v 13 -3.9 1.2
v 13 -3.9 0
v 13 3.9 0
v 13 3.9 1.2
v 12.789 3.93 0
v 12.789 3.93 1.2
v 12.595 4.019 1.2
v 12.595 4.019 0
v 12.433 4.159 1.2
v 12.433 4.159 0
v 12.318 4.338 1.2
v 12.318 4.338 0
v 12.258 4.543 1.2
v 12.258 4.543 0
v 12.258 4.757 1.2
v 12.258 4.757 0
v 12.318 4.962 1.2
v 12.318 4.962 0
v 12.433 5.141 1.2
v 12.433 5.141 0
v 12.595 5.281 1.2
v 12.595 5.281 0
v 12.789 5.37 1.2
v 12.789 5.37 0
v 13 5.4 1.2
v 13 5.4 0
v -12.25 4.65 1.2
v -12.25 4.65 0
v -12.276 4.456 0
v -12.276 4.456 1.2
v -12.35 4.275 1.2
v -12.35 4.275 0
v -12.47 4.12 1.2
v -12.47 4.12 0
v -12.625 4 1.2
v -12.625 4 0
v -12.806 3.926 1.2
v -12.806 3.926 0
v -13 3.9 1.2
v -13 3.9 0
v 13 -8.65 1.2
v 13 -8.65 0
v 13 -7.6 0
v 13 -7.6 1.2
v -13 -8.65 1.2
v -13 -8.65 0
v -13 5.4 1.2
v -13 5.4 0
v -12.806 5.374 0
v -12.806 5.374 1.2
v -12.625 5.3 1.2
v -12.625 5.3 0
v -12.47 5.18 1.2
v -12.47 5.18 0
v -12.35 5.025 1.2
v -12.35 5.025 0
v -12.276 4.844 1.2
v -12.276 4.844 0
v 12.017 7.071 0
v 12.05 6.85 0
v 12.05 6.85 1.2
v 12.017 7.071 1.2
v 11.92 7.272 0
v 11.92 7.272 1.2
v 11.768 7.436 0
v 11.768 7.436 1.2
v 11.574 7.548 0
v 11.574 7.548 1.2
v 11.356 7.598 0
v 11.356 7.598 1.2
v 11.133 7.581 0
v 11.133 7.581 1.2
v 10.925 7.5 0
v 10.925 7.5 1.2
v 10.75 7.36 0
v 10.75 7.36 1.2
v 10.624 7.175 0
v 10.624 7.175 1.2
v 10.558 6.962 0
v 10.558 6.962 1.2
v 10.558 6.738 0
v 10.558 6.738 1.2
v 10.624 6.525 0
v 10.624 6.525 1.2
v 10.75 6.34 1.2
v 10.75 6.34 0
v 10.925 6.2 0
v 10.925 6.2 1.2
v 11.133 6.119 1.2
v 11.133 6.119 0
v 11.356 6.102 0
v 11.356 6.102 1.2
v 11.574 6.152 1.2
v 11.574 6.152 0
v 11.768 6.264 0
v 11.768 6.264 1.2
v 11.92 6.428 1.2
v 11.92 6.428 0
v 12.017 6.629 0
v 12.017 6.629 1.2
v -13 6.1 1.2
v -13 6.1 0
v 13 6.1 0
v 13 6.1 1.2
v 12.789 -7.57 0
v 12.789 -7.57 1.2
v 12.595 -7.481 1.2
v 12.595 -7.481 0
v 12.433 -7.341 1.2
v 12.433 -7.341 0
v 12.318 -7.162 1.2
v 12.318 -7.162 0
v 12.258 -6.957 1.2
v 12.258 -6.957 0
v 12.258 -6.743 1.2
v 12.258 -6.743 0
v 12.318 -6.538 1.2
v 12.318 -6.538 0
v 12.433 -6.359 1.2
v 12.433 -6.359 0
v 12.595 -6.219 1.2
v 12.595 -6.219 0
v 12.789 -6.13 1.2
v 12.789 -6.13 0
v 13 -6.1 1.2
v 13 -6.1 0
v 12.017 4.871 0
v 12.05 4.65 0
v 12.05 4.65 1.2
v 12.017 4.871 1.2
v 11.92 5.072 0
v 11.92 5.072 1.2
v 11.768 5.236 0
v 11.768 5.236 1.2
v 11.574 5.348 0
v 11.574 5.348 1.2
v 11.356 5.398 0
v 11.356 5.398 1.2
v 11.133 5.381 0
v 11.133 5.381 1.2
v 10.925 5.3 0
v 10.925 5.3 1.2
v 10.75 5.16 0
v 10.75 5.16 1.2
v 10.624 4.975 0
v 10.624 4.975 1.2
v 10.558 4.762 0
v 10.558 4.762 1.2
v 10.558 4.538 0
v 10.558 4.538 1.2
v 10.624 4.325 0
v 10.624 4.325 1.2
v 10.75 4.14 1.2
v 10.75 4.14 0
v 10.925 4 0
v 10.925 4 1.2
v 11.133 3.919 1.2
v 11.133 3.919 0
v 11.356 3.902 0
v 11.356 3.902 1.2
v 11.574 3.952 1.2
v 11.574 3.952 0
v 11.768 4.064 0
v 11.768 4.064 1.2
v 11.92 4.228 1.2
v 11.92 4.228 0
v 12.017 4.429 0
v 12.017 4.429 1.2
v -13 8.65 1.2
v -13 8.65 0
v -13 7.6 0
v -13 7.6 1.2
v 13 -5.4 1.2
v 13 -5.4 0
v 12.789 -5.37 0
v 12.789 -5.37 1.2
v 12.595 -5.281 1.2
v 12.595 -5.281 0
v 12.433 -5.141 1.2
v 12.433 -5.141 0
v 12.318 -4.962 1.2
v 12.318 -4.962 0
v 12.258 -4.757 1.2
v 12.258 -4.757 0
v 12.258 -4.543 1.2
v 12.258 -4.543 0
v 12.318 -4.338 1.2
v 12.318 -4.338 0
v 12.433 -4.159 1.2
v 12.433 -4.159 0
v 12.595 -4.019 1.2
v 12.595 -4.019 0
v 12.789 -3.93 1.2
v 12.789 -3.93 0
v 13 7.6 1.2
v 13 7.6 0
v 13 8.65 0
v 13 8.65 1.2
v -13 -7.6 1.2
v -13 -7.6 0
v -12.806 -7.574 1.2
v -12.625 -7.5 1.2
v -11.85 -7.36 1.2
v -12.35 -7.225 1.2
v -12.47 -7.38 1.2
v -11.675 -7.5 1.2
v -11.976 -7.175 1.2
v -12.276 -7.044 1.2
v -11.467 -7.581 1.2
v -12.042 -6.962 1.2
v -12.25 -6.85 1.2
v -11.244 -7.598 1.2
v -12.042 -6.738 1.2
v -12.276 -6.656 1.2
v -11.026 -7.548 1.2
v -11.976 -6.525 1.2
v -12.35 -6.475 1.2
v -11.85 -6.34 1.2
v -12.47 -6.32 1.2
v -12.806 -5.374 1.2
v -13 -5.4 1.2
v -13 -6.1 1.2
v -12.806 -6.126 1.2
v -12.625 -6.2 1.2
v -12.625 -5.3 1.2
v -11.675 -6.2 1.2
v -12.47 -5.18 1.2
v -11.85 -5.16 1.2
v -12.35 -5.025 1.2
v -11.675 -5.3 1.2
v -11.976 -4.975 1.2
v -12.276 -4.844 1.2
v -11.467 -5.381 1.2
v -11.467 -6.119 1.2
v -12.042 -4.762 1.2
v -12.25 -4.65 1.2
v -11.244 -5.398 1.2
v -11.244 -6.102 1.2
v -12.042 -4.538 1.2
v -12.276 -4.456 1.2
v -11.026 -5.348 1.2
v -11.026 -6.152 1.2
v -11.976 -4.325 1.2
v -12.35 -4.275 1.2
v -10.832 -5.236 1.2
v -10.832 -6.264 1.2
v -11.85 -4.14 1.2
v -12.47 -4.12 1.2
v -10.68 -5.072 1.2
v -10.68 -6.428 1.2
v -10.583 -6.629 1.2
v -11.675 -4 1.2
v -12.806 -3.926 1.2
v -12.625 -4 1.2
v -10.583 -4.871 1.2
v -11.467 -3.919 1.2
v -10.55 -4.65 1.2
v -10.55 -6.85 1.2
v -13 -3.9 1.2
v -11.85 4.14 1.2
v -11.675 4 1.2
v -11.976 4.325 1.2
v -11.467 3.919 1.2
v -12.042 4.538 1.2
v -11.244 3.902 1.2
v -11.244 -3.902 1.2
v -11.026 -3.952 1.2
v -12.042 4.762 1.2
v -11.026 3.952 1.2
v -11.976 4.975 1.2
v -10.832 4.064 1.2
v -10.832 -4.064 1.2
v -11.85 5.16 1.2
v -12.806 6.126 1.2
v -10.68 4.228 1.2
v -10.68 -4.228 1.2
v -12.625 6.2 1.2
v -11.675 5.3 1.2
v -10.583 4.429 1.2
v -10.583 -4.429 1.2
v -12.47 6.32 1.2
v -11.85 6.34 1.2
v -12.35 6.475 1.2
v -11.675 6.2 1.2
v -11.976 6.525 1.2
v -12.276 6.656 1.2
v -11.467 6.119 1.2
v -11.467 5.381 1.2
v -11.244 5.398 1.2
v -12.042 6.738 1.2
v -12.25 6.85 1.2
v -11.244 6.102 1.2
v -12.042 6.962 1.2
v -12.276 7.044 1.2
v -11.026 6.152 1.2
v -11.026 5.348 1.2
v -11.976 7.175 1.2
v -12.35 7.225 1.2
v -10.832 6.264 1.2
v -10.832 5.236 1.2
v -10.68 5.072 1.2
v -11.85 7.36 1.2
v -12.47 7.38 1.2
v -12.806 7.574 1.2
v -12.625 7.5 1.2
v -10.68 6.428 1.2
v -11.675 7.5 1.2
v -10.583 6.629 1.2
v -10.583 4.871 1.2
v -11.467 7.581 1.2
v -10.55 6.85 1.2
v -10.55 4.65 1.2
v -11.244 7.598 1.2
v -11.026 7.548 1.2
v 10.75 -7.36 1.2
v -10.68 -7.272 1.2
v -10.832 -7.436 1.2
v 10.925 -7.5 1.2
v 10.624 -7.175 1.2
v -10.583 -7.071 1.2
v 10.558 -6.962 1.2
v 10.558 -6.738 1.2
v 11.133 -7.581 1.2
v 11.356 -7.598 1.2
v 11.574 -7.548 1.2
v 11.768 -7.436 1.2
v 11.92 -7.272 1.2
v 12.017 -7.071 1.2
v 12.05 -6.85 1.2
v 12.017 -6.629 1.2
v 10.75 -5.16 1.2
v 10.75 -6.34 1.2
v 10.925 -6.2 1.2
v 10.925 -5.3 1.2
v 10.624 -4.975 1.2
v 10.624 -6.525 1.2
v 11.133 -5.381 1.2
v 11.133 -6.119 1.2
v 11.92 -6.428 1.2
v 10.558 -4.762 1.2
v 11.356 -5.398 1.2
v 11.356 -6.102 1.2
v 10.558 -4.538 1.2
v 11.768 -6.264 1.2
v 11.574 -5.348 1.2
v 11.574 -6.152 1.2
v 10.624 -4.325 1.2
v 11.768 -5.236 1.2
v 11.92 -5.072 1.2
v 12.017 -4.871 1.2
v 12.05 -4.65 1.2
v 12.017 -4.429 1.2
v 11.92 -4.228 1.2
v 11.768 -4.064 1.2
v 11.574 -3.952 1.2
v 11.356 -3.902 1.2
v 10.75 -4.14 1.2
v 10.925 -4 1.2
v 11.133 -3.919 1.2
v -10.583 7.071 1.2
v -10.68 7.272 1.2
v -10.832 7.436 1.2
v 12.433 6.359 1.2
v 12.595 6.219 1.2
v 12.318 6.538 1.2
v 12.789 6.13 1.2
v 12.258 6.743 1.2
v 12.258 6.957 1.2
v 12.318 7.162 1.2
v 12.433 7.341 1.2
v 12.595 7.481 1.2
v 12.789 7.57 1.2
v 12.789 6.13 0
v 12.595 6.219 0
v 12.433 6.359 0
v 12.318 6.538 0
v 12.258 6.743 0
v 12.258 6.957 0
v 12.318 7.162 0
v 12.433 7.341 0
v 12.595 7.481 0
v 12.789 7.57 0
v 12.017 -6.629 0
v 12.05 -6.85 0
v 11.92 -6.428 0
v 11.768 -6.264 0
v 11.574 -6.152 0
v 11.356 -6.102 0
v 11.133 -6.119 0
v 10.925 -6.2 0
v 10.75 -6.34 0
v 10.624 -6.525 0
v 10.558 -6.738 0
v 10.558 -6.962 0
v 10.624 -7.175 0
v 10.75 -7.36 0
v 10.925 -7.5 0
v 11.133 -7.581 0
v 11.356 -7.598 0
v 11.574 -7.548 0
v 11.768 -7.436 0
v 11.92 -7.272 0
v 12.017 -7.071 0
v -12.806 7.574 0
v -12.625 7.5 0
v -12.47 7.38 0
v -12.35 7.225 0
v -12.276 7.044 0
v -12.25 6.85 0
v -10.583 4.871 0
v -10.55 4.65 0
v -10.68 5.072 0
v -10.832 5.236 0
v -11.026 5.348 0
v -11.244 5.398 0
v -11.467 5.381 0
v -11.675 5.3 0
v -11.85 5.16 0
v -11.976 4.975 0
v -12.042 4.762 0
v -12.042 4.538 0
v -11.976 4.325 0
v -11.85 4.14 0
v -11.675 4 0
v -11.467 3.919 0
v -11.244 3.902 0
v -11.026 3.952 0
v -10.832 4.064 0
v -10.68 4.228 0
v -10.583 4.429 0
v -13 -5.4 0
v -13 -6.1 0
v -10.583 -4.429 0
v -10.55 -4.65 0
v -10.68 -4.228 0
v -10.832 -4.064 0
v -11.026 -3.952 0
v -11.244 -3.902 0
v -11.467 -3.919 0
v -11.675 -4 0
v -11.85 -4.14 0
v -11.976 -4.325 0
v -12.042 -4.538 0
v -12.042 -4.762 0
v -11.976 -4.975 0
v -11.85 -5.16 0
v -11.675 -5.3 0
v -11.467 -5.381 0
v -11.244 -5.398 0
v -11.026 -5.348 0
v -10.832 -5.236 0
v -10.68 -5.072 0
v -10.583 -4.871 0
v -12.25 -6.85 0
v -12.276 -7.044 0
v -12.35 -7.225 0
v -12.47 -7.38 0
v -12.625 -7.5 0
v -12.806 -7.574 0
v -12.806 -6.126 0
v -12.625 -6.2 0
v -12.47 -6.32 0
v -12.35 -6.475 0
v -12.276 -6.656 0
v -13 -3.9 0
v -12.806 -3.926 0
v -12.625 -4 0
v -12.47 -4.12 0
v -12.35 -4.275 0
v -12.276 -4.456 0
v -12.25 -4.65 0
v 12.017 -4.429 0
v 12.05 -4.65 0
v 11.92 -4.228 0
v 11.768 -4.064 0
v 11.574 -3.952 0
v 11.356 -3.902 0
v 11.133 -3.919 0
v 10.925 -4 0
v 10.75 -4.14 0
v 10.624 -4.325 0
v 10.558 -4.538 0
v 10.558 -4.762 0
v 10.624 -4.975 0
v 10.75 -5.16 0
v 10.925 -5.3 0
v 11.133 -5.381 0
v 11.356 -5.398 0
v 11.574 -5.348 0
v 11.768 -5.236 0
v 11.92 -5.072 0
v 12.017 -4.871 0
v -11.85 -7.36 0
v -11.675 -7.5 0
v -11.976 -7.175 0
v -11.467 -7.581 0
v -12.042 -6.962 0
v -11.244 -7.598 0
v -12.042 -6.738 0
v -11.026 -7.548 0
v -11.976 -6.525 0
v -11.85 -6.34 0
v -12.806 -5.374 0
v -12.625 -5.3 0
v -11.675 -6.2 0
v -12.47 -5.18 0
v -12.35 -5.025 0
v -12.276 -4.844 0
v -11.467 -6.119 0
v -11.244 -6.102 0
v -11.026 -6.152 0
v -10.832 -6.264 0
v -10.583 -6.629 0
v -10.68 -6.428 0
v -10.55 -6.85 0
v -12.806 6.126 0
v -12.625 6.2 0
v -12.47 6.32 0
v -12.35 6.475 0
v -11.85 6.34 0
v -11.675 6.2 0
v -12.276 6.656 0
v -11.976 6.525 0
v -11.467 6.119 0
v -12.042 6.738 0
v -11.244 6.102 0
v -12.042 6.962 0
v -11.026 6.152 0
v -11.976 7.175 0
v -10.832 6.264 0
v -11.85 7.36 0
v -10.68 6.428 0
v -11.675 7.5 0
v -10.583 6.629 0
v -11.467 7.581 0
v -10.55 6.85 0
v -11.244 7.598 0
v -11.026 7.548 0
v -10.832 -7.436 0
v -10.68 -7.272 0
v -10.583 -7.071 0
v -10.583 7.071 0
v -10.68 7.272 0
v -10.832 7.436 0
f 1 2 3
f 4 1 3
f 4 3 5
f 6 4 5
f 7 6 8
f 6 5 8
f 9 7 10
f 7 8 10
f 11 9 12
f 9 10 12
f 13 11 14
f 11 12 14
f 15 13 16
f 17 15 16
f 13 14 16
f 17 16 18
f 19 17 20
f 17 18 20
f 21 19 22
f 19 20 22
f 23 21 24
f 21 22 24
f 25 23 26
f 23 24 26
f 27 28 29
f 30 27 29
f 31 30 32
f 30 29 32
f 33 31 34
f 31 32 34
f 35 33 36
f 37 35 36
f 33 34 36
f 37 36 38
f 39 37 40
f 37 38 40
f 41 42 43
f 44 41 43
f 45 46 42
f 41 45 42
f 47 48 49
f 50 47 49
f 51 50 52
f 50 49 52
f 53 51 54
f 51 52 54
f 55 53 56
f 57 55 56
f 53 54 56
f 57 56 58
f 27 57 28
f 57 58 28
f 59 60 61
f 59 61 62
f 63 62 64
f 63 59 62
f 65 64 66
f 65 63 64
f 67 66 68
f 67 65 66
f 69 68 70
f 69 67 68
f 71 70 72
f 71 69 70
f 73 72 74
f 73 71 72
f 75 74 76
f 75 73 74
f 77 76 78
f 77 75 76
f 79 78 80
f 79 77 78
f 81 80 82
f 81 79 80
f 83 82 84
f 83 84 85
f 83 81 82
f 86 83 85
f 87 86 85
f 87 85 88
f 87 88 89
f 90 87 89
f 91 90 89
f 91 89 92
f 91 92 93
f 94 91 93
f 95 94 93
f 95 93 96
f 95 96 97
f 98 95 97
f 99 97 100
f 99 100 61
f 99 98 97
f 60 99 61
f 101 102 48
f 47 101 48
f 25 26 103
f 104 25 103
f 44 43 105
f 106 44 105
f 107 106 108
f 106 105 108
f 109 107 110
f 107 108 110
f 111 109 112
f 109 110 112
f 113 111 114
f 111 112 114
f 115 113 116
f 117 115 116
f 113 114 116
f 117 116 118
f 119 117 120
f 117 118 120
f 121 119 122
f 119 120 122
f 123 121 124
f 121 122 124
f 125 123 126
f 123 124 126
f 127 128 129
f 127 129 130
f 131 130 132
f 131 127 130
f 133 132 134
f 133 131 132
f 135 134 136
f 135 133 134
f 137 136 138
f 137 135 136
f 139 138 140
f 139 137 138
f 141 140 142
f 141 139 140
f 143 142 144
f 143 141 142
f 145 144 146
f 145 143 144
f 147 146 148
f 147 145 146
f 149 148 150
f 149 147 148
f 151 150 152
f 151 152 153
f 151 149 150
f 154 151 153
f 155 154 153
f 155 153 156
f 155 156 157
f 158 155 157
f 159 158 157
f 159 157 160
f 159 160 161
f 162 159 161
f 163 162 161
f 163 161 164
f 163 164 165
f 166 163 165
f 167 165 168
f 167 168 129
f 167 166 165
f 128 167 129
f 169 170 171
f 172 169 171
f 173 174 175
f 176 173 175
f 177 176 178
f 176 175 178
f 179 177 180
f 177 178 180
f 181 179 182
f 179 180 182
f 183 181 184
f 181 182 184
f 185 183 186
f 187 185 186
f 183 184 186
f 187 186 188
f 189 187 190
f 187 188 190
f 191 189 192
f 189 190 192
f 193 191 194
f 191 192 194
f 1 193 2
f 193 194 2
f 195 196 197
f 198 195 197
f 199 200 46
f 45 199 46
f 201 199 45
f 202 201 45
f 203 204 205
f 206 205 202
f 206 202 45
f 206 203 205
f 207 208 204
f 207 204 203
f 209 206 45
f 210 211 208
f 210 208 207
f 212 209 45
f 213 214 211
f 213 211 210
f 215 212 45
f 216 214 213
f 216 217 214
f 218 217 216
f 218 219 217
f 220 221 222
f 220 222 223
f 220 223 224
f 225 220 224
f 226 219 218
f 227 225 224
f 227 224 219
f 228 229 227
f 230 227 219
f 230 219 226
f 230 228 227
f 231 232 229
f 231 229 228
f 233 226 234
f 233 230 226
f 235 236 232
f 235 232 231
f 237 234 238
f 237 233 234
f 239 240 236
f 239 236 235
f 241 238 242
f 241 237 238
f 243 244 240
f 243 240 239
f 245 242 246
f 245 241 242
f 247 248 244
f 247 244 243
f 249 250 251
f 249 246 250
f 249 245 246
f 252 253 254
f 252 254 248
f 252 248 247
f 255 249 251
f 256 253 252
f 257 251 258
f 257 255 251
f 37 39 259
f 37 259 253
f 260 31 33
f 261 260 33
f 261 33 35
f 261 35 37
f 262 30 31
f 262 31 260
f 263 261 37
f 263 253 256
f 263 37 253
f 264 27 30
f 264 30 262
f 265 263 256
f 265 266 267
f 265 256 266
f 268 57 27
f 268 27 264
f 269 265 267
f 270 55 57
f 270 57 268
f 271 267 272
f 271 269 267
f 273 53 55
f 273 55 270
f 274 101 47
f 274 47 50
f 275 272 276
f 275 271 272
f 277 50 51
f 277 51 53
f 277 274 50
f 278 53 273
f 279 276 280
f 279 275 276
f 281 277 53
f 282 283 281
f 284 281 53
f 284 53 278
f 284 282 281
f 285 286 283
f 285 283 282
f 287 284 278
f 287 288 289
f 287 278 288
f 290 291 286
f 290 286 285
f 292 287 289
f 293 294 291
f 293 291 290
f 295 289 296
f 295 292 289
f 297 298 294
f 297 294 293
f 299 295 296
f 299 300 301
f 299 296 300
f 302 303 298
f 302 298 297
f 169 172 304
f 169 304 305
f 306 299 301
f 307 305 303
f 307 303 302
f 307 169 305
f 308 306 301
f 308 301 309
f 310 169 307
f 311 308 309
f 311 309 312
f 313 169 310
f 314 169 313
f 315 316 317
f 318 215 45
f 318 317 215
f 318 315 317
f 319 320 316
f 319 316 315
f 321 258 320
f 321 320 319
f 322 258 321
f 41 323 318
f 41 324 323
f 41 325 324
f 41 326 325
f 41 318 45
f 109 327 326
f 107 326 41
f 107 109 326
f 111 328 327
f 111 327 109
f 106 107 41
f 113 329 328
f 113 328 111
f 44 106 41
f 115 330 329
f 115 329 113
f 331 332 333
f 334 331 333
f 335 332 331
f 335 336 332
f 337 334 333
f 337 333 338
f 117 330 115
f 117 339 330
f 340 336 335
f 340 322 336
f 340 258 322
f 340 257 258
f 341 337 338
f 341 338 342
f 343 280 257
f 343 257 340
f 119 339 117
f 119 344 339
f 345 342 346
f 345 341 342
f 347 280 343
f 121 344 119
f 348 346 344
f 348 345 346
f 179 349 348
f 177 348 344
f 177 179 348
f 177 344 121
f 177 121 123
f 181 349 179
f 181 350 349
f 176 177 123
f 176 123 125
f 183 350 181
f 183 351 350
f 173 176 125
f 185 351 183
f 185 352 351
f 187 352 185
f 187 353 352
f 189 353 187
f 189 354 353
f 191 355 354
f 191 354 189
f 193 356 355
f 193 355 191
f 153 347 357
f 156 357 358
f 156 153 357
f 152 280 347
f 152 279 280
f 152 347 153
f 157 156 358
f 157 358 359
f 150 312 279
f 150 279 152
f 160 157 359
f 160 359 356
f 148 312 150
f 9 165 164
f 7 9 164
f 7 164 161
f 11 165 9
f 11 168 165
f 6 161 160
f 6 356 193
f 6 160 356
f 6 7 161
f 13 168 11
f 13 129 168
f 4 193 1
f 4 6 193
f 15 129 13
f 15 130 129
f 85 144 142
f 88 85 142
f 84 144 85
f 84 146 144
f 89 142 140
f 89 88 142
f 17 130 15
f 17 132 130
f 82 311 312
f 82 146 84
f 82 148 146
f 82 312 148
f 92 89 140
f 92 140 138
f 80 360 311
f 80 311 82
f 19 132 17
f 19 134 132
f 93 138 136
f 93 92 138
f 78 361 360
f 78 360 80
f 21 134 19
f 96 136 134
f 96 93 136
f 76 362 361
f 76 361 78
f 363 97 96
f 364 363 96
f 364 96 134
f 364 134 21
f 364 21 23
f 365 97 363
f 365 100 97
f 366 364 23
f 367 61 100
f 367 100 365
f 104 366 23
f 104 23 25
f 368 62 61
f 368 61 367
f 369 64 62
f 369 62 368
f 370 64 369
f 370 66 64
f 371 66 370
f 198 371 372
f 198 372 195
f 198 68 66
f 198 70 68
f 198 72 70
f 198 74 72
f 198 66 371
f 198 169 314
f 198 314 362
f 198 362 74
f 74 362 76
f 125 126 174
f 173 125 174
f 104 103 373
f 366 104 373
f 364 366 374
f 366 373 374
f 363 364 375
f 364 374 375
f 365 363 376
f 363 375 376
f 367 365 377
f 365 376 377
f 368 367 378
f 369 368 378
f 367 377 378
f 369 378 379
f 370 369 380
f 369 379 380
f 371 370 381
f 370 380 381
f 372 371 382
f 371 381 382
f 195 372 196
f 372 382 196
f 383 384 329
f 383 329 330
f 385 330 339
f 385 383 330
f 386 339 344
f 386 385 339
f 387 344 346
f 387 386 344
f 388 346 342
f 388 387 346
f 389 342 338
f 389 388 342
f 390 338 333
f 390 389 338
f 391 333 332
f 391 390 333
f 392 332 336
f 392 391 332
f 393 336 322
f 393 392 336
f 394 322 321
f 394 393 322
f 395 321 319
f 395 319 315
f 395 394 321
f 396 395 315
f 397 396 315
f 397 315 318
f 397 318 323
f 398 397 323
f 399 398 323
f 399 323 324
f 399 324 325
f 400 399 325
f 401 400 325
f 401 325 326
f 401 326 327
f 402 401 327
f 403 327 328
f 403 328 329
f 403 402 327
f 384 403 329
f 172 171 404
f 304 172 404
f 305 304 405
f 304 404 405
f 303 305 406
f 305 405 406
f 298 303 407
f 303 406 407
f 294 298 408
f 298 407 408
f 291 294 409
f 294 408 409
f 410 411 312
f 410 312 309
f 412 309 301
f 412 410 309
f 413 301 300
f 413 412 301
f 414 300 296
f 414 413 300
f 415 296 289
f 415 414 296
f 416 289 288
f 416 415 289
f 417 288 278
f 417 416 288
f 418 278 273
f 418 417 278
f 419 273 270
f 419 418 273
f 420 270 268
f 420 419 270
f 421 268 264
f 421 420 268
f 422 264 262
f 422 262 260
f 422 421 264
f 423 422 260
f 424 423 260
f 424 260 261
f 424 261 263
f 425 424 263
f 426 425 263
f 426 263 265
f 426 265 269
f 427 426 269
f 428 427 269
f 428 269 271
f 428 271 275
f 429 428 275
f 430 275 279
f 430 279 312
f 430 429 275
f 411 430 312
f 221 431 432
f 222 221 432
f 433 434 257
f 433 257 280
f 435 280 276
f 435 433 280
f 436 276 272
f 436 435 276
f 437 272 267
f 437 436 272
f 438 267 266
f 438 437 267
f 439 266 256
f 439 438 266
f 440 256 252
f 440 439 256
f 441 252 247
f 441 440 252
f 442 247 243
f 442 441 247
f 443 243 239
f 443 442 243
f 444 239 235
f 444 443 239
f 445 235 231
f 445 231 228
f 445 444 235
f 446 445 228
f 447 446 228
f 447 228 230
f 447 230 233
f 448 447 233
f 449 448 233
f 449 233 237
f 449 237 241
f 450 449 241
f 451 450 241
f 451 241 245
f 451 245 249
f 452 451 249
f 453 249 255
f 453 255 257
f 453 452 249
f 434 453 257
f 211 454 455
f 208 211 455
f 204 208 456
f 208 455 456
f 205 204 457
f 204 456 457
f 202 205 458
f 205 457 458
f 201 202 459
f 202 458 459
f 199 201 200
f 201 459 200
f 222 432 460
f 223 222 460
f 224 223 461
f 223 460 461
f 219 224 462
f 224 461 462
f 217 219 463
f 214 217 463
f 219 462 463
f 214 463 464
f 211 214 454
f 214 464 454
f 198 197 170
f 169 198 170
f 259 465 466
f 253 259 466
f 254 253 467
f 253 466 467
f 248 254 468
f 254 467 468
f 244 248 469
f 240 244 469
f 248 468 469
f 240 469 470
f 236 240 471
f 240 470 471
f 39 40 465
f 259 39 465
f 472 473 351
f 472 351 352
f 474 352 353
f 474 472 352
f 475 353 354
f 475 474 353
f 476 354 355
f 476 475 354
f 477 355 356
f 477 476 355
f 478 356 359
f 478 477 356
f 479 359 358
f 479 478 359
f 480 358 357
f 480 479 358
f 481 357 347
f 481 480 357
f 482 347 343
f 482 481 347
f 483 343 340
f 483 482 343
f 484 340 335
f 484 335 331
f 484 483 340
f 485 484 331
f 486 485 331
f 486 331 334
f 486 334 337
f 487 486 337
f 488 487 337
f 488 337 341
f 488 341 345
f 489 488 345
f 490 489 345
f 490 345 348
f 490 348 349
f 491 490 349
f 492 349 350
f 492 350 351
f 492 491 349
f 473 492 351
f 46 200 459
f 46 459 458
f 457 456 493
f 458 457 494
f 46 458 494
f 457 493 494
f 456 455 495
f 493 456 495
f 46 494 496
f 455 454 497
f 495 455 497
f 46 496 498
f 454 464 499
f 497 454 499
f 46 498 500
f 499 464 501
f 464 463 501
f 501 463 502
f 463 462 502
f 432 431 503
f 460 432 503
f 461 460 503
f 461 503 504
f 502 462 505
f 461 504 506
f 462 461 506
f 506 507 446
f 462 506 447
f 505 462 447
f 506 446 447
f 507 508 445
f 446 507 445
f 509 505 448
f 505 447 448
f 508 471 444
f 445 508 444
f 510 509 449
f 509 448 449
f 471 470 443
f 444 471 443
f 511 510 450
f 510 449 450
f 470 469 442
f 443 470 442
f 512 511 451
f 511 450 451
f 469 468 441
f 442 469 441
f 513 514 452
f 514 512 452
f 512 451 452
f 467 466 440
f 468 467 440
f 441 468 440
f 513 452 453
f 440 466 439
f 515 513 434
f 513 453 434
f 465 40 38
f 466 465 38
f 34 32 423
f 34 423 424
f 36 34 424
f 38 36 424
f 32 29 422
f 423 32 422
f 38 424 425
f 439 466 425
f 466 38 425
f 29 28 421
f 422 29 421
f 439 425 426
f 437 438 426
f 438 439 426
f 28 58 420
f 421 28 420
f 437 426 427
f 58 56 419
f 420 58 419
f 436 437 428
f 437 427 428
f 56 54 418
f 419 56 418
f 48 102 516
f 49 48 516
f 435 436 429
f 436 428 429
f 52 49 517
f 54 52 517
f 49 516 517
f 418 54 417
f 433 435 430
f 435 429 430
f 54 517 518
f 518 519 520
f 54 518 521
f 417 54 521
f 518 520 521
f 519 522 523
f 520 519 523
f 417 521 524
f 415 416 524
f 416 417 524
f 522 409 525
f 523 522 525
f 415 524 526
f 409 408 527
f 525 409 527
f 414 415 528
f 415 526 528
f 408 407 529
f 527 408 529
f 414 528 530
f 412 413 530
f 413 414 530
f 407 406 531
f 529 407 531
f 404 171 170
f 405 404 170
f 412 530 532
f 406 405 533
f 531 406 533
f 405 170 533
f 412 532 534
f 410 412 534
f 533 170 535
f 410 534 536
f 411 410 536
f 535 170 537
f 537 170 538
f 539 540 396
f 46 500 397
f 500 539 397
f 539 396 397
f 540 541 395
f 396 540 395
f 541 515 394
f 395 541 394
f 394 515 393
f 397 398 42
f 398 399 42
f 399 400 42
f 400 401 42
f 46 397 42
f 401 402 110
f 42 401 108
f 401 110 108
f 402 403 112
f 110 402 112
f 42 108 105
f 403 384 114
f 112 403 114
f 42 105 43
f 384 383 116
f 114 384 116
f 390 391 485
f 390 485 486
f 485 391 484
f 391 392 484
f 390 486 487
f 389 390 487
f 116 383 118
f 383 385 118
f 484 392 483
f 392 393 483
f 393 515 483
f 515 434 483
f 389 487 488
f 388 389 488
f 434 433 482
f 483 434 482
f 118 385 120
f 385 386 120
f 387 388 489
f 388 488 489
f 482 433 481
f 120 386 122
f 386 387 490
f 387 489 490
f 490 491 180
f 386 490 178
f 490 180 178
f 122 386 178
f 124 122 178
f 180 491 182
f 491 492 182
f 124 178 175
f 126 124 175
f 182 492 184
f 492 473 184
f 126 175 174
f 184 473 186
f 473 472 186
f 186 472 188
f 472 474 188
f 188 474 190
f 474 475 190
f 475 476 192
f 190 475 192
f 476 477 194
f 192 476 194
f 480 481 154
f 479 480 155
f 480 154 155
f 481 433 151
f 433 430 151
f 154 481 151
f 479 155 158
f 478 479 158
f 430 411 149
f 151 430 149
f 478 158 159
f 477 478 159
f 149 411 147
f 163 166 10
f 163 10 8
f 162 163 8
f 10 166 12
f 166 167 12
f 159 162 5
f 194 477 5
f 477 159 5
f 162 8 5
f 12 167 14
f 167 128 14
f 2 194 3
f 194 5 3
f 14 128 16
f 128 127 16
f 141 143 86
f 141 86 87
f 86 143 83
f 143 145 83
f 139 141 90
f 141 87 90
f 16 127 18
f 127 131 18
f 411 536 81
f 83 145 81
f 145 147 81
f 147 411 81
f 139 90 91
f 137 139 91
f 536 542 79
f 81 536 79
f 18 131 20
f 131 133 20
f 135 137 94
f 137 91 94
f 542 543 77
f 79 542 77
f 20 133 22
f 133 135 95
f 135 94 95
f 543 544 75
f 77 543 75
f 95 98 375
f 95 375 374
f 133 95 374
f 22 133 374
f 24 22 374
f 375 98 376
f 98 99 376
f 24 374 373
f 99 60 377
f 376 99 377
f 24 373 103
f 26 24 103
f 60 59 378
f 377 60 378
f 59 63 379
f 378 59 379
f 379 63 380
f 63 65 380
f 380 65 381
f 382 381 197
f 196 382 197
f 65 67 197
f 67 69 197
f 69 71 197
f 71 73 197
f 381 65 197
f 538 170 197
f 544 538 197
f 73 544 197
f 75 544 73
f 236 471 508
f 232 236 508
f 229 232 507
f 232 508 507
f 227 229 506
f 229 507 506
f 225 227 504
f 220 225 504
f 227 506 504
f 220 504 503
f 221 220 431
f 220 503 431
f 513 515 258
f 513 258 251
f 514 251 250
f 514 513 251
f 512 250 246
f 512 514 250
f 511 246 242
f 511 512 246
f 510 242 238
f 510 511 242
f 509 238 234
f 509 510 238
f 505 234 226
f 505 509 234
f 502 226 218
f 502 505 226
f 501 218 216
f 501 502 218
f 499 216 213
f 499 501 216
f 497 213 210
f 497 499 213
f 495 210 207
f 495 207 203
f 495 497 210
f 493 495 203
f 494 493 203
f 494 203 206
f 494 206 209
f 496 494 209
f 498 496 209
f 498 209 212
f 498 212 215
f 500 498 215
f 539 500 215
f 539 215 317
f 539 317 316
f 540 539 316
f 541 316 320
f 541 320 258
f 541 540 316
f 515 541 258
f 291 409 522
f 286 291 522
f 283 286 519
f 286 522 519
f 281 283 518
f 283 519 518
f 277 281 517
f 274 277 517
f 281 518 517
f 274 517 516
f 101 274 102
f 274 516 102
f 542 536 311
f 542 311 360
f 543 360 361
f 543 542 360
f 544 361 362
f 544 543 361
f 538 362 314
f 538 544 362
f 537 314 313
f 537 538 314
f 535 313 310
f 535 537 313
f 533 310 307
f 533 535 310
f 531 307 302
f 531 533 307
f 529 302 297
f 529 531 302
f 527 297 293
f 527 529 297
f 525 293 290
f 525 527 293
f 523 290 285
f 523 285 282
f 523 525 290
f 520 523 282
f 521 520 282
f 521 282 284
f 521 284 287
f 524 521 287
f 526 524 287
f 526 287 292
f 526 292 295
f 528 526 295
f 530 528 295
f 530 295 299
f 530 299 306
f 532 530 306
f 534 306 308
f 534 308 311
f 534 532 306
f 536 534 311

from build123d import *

# Parameters (mm, degrees)
SKETCH1_R           = 0.75
BOSS_EXTRUDE1_DEPTH = 1.2


with BuildPart() as part:
    # Sketch1 → Boss-Extrude1 (new body)
    with BuildSketch(Plane.XY):
        with BuildLine():
            Line((13, 8.65), (-13, 8.65))
            Line((-13, 8.65), (-13, 7.6))
            ThreePointArc((-13, 7.6), (-12.469669914, 7.380330086), (-12.25, 6.85))
            ThreePointArc((-12.25, 6.85), (-12.469669914, 6.319669914), (-13, 6.1))
            Line((-13, 6.1), (-13, 5.4))
            ThreePointArc((-13, 5.4), (-12.469669914, 5.180330086), (-12.25, 4.65))
            ThreePointArc((-12.25, 4.65), (-12.469669914, 4.119669914), (-13, 3.9))
            Line((-13, 3.9), (-13, -3.9))
            ThreePointArc((-13, -3.9), (-12.469669914, -4.119669914), (-12.25, -4.65))
            ThreePointArc((-12.25, -4.65), (-12.469669914, -5.180330086), (-13, -5.4))
            Line((-13, -5.4), (-13, -6.1))
            ThreePointArc((-13, -6.1), (-12.469669914, -6.319669914), (-12.25, -6.85))
            ThreePointArc((-12.25, -6.85), (-12.469669914, -7.380330086), (-13, -7.6))
            Line((-13, -7.6), (-13, -8.65))
            Line((-13, -8.65), (13, -8.65))
            Line((13, -8.65), (13, -7.6))
            ThreePointArc((13, -7.6), (12.25, -6.85), (13, -6.1))
            Line((13, -6.1), (13, -5.4))
            ThreePointArc((13, -5.4), (12.25, -4.65), (13, -3.9))
            Line((13, -3.9), (13, 3.9))
            ThreePointArc((13, 3.9), (12.25, 4.65), (13, 5.4))
            Line((13, 5.4), (13, 6.1))
            ThreePointArc((13, 6.1), (12.25, 6.85), (13, 7.6))
            Line((13, 7.6), (13, 8.65))
        make_face()
        with Locations((-11.3, -6.85)):
            Circle(SKETCH1_R, mode=Mode.SUBTRACT)
        with Locations((-11.3, -4.65)):
            Circle(SKETCH1_R, mode=Mode.SUBTRACT)
        with Locations((11.3, -6.85)):
            Circle(SKETCH1_R, mode=Mode.SUBTRACT)
        with Locations((11.3, -4.65)):
            Circle(SKETCH1_R, mode=Mode.SUBTRACT)
        with Locations((-11.3, 4.65)):
            Circle(SKETCH1_R, mode=Mode.SUBTRACT)
        with Locations((-11.3, 6.85)):
            Circle(SKETCH1_R, mode=Mode.SUBTRACT)
        with Locations((11.3, 4.65)):
            Circle(SKETCH1_R, mode=Mode.SUBTRACT)
        with Locations((11.3, 6.85)):
            Circle(SKETCH1_R, mode=Mode.SUBTRACT)
    extrude(amount=BOSS_EXTRUDE1_DEPTH)


solid = part.part
